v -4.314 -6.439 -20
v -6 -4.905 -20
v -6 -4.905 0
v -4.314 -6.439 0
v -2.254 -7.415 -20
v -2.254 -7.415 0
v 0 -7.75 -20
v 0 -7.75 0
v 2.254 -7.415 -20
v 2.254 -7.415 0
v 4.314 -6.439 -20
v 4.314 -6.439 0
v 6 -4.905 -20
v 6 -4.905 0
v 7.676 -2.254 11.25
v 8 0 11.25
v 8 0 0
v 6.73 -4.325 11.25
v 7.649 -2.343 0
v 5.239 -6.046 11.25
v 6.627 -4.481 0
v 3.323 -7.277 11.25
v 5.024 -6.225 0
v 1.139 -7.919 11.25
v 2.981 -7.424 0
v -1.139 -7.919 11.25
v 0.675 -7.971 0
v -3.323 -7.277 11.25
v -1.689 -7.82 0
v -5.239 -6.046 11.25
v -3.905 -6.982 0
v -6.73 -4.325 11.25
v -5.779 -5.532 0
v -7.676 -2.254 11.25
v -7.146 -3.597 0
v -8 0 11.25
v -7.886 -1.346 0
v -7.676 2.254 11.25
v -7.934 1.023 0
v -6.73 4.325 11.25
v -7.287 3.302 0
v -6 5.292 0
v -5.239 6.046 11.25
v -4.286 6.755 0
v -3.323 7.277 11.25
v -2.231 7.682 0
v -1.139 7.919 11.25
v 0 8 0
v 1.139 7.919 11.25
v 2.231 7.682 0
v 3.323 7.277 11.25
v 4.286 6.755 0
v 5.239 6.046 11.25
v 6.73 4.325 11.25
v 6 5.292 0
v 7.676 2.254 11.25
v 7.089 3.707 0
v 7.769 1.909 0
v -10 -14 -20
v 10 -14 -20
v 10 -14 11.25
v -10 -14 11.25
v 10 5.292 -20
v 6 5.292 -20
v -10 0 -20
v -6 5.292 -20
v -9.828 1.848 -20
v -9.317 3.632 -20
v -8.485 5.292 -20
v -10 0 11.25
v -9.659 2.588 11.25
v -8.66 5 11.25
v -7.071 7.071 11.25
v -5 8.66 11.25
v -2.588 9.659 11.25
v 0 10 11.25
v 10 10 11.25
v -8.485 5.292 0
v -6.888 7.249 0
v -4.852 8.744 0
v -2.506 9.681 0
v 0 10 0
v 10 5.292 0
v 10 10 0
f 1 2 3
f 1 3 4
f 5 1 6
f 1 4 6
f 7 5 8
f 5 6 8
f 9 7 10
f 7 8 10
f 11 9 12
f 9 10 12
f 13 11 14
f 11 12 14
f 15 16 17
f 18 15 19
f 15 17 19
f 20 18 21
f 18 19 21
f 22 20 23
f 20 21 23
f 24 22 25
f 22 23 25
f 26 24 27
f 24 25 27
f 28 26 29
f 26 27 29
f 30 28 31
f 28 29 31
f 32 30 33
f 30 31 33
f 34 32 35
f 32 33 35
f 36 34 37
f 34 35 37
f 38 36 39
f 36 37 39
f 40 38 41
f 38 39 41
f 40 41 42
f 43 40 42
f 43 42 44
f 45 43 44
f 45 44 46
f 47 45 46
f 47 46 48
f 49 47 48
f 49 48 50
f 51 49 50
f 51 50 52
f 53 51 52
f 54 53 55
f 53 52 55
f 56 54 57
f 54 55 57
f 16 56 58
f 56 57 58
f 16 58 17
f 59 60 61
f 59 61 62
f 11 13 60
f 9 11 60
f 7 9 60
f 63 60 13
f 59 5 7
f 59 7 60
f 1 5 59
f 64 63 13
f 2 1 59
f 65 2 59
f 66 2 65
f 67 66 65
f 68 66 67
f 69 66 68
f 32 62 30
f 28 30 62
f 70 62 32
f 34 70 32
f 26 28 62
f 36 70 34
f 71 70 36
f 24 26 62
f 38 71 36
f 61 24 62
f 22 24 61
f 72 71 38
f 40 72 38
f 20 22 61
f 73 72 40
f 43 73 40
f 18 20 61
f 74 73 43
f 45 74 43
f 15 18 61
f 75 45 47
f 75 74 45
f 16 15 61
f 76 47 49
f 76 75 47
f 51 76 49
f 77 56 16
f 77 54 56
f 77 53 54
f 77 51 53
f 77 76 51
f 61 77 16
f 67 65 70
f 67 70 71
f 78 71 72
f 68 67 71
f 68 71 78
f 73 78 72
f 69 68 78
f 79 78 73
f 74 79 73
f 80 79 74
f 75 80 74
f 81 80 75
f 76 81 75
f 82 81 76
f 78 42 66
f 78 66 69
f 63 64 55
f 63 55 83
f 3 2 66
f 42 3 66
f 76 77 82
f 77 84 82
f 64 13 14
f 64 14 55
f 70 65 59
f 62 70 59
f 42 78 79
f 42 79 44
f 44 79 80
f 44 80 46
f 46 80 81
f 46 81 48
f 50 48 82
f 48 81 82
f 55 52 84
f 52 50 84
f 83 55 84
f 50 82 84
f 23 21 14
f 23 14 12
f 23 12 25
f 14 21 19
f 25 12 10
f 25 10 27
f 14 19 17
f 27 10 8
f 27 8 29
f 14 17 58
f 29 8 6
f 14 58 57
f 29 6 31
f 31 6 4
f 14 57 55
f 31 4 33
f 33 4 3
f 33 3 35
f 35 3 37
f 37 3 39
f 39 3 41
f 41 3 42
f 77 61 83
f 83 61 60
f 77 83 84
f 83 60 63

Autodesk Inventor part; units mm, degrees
ref_plane "YZ Plane" through (0, 0, 0) normal (1, 0, 0) x (0, 1, 0)
ref_plane "XZ Plane" through (0, 0, 0) normal (0, 1, 0) x (-1, 0, 0)
ref_plane "XY Plane" through (0, 0, 0) normal (0, 0, 1) x (1, 0, 0)
sketch "Sketch4" plane through (0, 0, 0) normal (0, 0, 1) x (1, 0, 0)
  circle A0 centre (0, 0) radius 8
  circle A1 centre (0, 0) radius 10
  line L0 (-10, 0) -> (-10, -14)
  line L1 (10, 0) -> (10, -14)
  line L2 (10, -14) -> (-10, -14)
  line L3 (10, 0) -> (10, 10)
  line L4 (10, 10) -> (0, 10)
  point P0 (10, -7)
  dimension "d12" = 16
  dimension "d13" = 2
  dimension "d14" = 14
  dimension "d17" = 20
extrude "Extrusion3" add sketch "Sketch4" along normal blind 11.25
sketch "Sketch5" plane through (0, 0, 0) normal (0, 0, -1) x (-1, 0, 0)
  circle A0 centre (0, 0) radius 8 projected
  line L0 (0, -19.2142) -> (0, 17.2853) projected
  arc A1 (10, 0) -> (0, 10) centre (0, 0) ccw projected
  line L1 (10, 0) -> (10, -14) projected
  arc A2 (10, 0) -> (0, 10) centre (0, 0) ccw projected
  line L2 (10, -14) -> (-10, -14) projected
  circle A3 centre (0, 0) radius 8 projected
  line L3 (-10, 10) -> (0, 10) projected
  line L4 (-10, -14) -> (-10, 10) projected
  circle A4 centre (0, 0) radius 7.75
  line L5 (-6, -4.9054) -> (-6, 4.9054)
  line L6 (6, -4.9054) -> (6, 4.9054)
  line L7 (-6, 4.9054) -> (-6, 5.2915)
  line L8 (6, 4.9054) -> (6, 5.2915)
  line L9 (-6, 5.2915) -> (-10, 5.2915)
  line L10 (-10, -14) -> (-10, 10) projected
  line L11 (6, 5.2915) -> (8.4853, 5.2915)
  point P0 (-10, 0)
  point P1 (-10, 0)
  dimension "d24" = 15.5
  dimension "d25" = 12
extrude "Extrusion4" add sketch "Sketch5" along normal blind 20 contours A0 L0 A4 L8 | A0 L11 A1 L1 L2 L0 | L0 L2 L4 L9 A0 | A0 L7 A4 L0 | A4 L6 | L5 A4 picked at (6.6814, 4.0106) picked at (-6.667, 4.0378)
equation "\"d14\" = DriveMotorHeight - BaseWallThickness"
equation "\"DriveMotorHeight\" = 17"
equation "\"BaseWallThickness\" = 3"
properties part number "MotorMountV1" material "Thermoplastic Resin"
